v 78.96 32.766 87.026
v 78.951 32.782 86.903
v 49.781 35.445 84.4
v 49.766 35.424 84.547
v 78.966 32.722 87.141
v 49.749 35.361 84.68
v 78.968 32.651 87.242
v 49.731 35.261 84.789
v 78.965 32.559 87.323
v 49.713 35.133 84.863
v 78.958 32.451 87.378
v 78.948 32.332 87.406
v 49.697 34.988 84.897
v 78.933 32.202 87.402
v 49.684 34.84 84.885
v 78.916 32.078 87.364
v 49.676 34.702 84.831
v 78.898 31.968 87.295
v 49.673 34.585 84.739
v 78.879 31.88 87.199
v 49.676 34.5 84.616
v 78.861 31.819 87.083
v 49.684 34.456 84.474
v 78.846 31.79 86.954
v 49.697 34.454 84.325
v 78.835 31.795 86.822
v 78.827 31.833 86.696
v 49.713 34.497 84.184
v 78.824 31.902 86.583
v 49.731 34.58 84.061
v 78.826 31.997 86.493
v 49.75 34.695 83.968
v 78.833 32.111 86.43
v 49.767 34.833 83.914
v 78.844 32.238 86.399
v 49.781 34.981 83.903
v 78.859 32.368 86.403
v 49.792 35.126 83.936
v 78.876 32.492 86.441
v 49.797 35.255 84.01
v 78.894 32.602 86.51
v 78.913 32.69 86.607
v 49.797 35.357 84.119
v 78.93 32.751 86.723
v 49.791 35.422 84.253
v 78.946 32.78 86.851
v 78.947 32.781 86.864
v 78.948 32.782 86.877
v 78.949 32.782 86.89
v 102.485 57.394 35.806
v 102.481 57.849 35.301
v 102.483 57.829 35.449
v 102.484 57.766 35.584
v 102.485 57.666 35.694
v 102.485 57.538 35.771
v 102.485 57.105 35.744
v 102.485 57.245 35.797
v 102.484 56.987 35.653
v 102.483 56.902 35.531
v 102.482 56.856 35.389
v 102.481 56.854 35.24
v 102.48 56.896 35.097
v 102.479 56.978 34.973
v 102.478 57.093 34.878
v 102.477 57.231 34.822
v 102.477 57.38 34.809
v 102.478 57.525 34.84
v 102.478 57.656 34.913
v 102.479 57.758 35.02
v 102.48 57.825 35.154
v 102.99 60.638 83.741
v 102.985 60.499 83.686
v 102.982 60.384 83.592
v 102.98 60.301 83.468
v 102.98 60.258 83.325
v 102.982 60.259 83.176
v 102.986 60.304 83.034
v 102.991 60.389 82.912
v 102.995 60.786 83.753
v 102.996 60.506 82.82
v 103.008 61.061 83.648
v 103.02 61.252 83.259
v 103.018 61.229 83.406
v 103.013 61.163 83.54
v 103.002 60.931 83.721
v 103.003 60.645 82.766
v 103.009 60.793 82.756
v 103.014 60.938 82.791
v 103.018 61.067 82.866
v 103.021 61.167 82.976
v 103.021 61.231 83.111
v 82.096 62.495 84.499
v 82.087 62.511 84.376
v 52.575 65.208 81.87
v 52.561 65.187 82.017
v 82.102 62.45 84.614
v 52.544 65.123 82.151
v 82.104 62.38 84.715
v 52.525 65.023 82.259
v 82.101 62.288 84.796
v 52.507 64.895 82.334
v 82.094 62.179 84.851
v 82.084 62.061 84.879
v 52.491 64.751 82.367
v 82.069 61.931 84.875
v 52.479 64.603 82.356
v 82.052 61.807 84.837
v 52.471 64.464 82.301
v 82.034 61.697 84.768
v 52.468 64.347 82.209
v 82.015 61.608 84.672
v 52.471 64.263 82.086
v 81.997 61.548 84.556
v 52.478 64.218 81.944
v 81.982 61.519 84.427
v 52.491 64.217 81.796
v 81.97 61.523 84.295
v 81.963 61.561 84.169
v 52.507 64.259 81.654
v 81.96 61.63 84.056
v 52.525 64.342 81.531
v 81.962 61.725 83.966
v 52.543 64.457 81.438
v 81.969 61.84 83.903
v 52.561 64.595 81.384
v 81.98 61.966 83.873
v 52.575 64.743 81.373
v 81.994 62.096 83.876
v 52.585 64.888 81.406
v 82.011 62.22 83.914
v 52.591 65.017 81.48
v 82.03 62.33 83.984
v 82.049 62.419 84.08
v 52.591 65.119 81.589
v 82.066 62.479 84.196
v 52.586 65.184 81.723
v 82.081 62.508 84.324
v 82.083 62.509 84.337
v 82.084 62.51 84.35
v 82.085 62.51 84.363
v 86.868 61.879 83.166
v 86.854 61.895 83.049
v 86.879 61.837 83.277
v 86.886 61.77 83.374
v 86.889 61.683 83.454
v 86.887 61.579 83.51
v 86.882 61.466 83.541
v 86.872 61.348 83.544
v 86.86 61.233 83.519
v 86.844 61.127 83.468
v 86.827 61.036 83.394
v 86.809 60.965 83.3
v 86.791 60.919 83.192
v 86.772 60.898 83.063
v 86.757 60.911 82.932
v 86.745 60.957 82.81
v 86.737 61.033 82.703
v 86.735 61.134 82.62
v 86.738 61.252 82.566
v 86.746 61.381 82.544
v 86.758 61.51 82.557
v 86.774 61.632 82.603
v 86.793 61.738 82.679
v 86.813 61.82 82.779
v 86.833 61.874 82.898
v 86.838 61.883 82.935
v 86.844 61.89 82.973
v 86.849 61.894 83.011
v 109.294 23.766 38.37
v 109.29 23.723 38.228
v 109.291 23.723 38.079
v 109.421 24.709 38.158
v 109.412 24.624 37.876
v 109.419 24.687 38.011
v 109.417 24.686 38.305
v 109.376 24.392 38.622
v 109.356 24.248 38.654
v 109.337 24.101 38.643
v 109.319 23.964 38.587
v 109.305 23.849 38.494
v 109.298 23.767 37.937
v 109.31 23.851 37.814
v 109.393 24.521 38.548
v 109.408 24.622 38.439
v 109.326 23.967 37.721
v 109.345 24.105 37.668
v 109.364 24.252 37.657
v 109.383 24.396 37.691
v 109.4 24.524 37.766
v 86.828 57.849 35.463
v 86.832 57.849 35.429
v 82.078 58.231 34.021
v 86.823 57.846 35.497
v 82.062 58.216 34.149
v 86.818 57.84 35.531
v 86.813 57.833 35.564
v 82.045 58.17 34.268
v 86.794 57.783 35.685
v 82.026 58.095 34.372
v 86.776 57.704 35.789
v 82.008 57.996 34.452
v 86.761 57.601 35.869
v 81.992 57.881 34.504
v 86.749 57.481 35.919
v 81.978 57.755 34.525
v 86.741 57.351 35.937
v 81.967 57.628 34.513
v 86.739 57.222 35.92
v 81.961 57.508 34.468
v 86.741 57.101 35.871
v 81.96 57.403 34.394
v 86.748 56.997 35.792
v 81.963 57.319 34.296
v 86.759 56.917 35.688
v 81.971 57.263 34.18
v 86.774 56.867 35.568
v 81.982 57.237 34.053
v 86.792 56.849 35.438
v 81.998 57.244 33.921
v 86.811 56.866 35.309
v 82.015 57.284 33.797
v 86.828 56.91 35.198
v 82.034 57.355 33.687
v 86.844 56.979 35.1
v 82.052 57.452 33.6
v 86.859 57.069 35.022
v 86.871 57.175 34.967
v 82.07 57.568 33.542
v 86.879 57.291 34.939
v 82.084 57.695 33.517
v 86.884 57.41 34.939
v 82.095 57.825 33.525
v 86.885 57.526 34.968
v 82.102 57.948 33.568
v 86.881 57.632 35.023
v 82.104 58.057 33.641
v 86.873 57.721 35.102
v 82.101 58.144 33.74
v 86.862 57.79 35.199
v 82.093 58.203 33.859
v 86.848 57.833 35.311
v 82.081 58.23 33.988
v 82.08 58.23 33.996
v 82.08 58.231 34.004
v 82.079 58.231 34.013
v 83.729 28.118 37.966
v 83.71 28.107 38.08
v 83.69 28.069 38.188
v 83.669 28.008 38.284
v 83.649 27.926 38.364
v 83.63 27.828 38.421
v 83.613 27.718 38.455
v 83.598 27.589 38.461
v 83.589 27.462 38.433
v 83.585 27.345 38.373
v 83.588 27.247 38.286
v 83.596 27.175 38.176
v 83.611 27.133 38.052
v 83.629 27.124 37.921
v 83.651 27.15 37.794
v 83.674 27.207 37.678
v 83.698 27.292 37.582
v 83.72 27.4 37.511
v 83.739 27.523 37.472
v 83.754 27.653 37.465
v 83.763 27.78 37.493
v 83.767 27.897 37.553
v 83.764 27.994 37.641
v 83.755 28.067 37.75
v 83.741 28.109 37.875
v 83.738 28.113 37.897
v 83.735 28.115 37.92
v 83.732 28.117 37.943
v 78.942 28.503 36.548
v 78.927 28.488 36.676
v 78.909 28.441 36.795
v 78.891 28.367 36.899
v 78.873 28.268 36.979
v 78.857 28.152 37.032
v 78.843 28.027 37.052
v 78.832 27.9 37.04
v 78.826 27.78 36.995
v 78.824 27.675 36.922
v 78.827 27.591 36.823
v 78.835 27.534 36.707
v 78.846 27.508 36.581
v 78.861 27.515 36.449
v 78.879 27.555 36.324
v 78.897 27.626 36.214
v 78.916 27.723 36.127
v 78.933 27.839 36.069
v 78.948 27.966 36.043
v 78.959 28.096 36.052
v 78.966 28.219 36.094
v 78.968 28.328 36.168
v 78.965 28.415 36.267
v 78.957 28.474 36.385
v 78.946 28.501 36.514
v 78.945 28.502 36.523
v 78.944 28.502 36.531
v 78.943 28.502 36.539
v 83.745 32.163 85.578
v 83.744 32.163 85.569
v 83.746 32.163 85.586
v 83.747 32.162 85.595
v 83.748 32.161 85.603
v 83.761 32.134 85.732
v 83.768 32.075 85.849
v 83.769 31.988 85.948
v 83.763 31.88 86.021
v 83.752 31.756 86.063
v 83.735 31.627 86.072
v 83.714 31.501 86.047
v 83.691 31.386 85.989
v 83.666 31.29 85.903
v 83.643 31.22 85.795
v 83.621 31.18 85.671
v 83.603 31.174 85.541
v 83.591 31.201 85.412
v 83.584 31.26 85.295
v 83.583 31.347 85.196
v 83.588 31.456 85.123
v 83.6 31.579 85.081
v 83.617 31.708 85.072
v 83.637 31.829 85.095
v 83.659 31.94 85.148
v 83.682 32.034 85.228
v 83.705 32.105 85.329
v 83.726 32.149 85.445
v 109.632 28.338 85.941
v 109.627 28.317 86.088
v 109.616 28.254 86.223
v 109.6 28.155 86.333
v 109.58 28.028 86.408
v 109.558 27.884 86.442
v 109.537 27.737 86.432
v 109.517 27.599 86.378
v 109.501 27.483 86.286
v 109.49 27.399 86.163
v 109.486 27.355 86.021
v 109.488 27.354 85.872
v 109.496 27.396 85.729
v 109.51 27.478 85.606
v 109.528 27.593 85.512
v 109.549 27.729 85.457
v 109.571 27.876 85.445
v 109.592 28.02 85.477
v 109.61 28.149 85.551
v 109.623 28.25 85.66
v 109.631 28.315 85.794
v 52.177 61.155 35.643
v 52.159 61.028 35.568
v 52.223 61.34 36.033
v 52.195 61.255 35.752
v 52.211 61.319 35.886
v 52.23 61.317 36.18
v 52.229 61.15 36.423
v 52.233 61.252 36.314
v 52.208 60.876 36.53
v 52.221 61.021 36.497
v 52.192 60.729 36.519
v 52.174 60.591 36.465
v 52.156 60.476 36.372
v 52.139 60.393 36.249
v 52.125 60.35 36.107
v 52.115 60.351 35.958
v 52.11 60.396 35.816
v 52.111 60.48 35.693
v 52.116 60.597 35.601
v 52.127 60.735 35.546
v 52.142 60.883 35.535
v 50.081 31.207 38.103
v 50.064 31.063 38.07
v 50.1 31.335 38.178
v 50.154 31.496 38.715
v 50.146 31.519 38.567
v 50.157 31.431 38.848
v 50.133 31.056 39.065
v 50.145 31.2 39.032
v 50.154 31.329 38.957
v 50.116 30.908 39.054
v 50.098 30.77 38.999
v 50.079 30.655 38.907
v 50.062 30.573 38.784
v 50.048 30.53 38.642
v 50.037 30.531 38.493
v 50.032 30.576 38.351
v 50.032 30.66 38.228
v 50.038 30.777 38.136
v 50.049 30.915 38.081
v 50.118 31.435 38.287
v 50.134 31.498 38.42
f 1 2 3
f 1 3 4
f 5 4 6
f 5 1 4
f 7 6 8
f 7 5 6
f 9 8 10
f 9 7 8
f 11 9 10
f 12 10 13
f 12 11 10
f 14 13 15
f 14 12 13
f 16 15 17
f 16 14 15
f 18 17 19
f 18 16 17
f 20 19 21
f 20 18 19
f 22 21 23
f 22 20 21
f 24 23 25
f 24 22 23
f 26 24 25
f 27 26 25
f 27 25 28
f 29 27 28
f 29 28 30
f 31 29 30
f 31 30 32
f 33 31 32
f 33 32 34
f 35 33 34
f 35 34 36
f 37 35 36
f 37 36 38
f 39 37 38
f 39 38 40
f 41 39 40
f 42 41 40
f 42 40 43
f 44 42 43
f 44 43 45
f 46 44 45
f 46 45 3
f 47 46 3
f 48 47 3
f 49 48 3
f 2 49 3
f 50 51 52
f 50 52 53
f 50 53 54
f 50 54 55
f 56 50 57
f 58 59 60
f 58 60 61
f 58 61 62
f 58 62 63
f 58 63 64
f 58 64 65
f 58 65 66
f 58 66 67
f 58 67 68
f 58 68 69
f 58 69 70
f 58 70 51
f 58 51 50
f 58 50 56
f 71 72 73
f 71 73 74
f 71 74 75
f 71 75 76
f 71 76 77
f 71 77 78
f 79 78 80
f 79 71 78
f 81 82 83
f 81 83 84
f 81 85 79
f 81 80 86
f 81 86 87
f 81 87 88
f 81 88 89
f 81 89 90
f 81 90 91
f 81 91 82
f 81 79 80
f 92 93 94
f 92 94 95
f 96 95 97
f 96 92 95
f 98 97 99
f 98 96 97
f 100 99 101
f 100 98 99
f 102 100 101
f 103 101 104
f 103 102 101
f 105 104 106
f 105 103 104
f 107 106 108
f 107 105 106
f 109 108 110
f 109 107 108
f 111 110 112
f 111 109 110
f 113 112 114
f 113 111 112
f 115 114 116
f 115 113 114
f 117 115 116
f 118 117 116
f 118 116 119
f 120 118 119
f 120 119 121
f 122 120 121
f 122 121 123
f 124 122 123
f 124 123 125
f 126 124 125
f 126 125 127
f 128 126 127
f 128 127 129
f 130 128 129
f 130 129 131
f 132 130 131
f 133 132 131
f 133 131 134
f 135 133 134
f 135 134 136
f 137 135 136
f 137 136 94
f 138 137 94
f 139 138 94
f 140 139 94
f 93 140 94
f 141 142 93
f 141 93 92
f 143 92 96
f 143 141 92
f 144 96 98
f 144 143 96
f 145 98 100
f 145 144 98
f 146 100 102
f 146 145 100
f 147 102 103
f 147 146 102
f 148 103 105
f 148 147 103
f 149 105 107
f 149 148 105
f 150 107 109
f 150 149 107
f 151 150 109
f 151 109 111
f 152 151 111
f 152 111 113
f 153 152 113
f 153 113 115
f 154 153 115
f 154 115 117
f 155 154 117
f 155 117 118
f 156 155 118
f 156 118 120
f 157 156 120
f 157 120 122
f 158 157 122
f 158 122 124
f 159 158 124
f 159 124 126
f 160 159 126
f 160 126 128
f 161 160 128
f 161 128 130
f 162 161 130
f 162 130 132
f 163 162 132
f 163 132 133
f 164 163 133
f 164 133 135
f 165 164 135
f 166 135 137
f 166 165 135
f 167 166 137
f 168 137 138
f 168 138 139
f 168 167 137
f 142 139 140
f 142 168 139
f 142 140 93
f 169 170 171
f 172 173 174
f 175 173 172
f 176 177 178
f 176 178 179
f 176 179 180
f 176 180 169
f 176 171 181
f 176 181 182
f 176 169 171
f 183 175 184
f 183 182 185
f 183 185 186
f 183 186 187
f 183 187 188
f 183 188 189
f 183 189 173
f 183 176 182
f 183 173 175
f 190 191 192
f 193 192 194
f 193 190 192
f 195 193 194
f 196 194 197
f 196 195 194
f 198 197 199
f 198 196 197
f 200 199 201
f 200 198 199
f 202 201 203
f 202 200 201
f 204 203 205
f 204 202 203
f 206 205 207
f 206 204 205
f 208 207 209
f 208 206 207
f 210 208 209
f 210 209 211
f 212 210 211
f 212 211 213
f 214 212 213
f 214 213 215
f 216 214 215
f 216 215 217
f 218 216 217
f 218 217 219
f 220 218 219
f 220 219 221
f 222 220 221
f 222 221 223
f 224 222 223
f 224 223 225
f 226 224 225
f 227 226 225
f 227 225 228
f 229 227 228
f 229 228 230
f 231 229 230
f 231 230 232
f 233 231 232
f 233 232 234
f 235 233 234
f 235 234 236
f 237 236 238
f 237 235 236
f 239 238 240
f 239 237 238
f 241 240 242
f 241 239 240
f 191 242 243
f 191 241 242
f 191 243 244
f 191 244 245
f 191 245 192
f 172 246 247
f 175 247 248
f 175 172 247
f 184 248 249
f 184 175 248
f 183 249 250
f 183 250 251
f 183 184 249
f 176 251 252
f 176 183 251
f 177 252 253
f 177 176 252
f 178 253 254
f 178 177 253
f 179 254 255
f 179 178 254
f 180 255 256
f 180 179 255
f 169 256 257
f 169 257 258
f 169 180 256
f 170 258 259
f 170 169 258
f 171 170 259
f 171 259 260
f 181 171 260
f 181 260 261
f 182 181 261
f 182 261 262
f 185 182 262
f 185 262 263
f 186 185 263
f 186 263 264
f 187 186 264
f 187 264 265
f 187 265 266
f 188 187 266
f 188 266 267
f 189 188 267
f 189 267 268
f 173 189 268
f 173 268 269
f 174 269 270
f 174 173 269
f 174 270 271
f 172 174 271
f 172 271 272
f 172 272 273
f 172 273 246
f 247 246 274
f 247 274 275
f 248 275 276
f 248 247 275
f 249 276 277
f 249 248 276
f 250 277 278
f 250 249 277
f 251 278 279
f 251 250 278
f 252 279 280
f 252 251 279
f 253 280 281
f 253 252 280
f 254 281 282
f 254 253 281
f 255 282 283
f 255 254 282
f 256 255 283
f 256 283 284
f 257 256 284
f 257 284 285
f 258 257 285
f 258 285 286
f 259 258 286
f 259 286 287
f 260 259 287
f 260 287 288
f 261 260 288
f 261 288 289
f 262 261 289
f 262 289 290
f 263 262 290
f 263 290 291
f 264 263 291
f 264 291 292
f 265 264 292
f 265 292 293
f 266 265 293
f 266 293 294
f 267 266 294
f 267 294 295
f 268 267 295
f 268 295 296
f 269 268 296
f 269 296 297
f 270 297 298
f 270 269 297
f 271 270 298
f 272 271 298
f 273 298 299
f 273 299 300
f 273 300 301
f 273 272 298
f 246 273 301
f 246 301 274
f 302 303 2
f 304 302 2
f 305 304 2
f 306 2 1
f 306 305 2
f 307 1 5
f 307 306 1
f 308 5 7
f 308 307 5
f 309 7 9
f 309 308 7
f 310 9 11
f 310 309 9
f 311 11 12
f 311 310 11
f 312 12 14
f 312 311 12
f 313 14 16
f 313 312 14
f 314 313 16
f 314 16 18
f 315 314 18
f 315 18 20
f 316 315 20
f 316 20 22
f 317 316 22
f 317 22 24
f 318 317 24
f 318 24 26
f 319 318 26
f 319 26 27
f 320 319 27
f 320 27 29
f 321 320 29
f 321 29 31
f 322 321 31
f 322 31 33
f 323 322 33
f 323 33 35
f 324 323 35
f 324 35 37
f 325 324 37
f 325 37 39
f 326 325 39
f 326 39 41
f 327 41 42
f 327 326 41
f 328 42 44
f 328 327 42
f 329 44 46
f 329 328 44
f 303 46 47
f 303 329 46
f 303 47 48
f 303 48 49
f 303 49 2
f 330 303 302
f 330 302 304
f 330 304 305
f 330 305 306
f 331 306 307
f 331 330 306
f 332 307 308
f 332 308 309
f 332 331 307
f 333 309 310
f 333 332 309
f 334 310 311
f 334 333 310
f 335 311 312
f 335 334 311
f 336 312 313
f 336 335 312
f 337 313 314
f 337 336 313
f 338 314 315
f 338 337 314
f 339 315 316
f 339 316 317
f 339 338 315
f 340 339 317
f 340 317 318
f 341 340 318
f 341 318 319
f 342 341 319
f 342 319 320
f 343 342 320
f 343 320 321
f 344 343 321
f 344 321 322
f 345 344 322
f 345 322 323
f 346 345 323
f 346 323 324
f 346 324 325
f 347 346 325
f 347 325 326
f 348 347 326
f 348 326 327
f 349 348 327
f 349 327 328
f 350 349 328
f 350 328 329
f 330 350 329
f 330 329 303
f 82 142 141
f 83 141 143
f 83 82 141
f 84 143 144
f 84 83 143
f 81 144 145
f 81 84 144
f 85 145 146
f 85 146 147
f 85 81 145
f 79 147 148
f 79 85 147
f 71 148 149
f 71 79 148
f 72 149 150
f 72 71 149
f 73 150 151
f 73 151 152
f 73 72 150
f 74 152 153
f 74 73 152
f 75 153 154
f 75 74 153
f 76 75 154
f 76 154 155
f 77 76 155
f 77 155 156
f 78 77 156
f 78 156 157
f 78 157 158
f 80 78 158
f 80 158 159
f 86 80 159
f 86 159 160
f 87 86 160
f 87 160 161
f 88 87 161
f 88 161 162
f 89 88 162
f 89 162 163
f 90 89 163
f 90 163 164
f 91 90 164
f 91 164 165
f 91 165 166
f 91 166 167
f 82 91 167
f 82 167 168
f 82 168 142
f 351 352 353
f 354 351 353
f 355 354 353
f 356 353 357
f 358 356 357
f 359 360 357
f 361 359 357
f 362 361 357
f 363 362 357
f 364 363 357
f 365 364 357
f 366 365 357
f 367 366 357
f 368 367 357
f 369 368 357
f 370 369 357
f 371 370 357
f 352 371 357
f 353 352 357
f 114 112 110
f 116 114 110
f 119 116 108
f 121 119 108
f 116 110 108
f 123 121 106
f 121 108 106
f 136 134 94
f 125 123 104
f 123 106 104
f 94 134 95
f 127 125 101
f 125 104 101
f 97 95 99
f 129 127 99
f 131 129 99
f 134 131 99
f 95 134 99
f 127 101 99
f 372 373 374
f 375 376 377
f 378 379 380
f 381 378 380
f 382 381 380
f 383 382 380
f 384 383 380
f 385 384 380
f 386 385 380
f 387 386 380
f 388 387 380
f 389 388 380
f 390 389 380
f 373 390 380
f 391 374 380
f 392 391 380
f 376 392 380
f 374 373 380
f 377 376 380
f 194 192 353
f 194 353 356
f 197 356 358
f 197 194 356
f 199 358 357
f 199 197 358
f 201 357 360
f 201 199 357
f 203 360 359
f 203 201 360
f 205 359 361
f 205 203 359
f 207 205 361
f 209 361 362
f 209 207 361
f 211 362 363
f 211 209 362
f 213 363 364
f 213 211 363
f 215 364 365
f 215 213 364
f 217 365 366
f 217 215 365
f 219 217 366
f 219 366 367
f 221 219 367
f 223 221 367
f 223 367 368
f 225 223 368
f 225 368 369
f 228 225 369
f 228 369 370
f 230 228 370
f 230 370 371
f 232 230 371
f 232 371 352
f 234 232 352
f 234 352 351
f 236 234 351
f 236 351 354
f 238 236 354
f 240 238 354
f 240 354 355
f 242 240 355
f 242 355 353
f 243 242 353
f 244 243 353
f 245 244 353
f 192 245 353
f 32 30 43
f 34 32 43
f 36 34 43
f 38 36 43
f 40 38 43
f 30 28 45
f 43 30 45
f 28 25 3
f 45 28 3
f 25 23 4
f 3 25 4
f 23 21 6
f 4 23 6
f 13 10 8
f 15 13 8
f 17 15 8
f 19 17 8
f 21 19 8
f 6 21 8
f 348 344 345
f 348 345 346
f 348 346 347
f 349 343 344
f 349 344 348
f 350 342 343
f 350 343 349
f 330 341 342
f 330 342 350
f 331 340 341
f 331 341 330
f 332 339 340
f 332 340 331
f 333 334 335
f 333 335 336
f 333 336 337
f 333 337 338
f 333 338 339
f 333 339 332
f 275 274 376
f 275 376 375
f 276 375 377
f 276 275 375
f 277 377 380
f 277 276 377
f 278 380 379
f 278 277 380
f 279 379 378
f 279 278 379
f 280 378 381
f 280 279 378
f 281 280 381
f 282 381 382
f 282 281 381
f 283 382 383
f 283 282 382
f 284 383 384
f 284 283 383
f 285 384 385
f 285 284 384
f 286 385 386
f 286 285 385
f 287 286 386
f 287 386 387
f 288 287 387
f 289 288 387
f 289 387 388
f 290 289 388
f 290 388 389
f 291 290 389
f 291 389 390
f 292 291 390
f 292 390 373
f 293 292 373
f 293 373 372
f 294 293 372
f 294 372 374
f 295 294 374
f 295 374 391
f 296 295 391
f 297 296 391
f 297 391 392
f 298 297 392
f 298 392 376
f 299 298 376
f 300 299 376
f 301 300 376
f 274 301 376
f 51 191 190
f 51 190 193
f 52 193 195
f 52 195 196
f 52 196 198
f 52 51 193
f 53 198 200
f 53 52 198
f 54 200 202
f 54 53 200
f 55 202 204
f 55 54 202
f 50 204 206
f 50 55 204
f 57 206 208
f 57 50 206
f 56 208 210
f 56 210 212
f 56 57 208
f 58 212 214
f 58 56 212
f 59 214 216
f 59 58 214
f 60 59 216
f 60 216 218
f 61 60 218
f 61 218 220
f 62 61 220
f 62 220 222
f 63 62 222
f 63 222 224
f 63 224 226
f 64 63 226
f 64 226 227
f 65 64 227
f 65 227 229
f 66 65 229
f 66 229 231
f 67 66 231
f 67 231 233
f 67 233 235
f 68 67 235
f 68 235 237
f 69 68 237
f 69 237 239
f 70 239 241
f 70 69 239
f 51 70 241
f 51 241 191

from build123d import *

# Parameters (mm, degrees)
SWEEP_1_PROFILE_R = 0.5
SWEEP_2_PROFILE_R = 0.5
SWEEP_3_PROFILE_R = 0.5
SWEEP_4_PROFILE_R = 0.5


with BuildPart() as part:
    # 扫描1: sweep along a curve in space
    with BuildLine() as sweep_1_path:
        Line((52.171085461, 60.842650367, 36.032668745), (82.031800547, 57.733121201, 34.020365643))
        Line((82.031800547, 57.733121201, 34.020365643), (86.811779566, 57.349259288, 35.436151859))
        Line((86.811779566, 57.349259288, 35.436151859), (102.481405378, 57.349259288, 35.307823101))
    # 扫描1 profile (on start of the path) → 扫描1 (sweep)
    with BuildSketch(Plane(origin=(52.171085461, 60.842650367, 36.032668745), x_dir=(0.10357438554911601, 0.9946217103291699, 0), z_dir=(0.9923949685878, -0.1033425050208269, -0.06687714839644278))):
        Circle(SWEEP_1_PROFILE_R)
    sweep(path=sweep_1_path.line, transition=Transition.RIGHT)


with BuildPart() as body_2:
    # 扫描2: sweep along a curve in space
    with BuildLine() as sweep_2_path:
        Line((50.094146041, 31.022171186, 38.567494979), (78.895946649, 28.004672299, 36.547369039))
        Line((78.895946649, 28.004672299, 36.547369039), (83.675925668, 27.620810386, 37.963155255))
        Line((109.355436502, 24.213192684, 38.155714127), (83.675925668, 27.620810386, 37.963155255))
    # 扫描2 profile (on start of the path) → 扫描2 (sweep)
    with BuildSketch(Plane(origin=(50.094146041, 31.022171186, 38.567494979), x_dir=(0.10419742757797212, 0.9945566329204856, 0), z_dir=(0.9921456467446154, -0.10394483406128718, -0.06958798112950629))):
        Circle(SWEEP_2_PROFILE_R)
    sweep(path=sweep_2_path.line, transition=Transition.RIGHT)


with BuildPart() as body_3:
    # 扫描3: sweep along a curve in space
    with BuildLine() as sweep_3_path:
        Line((49.735506476, 34.947362939, 84.399729522), (78.895946649, 32.285016295, 86.902658618))
        Line((78.895946649, 32.285016295, 86.902658618), (83.675925668, 31.667696631, 85.571975706))
        Line((83.675925668, 31.667696631, 85.571975706), (109.559212296, 27.843320909, 85.943660766))
    # 扫描3 profile (on start of the path) → 扫描3 (sweep)
    with BuildSketch(Plane(origin=(49.735506476, 34.947362939, 84.399729522), x_dir=(0.0909217860265156, 0.995858036481982, 0), z_dir=(0.992239780168551, -0.09059143941659012, 0.08516695224966031))):
        Circle(SWEEP_3_PROFILE_R)
    sweep(path=sweep_3_path.line, transition=Transition.RIGHT)


with BuildPart() as body_4:
    # 扫描4: sweep along a curve in space
    with BuildLine() as sweep_4_path:
        Line((52.529725026, 64.709621981, 81.869852167), (82.031800547, 62.013465198, 84.375655221))
        Line((82.031800547, 62.013465198, 84.375655221), (86.811779566, 61.396145534, 83.04497231))
        Line((86.811779566, 61.396145534, 83.04497231), (103.000566026, 60.75242454, 83.254592898))
    # 扫描4 profile (on start of the path) → 扫描4 (sweep)
    with BuildSketch(Plane(origin=(52.529725026, 64.709621981, 81.869852167), x_dir=(0.09100945482654034, 0.9958500284340891, 0), z_dir=(0.9923066478281535, -0.09068562982480165, 0.08428305416471385))):
        Circle(SWEEP_4_PROFILE_R)
    sweep(path=sweep_4_path.line, transition=Transition.RIGHT)


solid = Compound([part.part, body_2.part, body_3.part, body_4.part])
